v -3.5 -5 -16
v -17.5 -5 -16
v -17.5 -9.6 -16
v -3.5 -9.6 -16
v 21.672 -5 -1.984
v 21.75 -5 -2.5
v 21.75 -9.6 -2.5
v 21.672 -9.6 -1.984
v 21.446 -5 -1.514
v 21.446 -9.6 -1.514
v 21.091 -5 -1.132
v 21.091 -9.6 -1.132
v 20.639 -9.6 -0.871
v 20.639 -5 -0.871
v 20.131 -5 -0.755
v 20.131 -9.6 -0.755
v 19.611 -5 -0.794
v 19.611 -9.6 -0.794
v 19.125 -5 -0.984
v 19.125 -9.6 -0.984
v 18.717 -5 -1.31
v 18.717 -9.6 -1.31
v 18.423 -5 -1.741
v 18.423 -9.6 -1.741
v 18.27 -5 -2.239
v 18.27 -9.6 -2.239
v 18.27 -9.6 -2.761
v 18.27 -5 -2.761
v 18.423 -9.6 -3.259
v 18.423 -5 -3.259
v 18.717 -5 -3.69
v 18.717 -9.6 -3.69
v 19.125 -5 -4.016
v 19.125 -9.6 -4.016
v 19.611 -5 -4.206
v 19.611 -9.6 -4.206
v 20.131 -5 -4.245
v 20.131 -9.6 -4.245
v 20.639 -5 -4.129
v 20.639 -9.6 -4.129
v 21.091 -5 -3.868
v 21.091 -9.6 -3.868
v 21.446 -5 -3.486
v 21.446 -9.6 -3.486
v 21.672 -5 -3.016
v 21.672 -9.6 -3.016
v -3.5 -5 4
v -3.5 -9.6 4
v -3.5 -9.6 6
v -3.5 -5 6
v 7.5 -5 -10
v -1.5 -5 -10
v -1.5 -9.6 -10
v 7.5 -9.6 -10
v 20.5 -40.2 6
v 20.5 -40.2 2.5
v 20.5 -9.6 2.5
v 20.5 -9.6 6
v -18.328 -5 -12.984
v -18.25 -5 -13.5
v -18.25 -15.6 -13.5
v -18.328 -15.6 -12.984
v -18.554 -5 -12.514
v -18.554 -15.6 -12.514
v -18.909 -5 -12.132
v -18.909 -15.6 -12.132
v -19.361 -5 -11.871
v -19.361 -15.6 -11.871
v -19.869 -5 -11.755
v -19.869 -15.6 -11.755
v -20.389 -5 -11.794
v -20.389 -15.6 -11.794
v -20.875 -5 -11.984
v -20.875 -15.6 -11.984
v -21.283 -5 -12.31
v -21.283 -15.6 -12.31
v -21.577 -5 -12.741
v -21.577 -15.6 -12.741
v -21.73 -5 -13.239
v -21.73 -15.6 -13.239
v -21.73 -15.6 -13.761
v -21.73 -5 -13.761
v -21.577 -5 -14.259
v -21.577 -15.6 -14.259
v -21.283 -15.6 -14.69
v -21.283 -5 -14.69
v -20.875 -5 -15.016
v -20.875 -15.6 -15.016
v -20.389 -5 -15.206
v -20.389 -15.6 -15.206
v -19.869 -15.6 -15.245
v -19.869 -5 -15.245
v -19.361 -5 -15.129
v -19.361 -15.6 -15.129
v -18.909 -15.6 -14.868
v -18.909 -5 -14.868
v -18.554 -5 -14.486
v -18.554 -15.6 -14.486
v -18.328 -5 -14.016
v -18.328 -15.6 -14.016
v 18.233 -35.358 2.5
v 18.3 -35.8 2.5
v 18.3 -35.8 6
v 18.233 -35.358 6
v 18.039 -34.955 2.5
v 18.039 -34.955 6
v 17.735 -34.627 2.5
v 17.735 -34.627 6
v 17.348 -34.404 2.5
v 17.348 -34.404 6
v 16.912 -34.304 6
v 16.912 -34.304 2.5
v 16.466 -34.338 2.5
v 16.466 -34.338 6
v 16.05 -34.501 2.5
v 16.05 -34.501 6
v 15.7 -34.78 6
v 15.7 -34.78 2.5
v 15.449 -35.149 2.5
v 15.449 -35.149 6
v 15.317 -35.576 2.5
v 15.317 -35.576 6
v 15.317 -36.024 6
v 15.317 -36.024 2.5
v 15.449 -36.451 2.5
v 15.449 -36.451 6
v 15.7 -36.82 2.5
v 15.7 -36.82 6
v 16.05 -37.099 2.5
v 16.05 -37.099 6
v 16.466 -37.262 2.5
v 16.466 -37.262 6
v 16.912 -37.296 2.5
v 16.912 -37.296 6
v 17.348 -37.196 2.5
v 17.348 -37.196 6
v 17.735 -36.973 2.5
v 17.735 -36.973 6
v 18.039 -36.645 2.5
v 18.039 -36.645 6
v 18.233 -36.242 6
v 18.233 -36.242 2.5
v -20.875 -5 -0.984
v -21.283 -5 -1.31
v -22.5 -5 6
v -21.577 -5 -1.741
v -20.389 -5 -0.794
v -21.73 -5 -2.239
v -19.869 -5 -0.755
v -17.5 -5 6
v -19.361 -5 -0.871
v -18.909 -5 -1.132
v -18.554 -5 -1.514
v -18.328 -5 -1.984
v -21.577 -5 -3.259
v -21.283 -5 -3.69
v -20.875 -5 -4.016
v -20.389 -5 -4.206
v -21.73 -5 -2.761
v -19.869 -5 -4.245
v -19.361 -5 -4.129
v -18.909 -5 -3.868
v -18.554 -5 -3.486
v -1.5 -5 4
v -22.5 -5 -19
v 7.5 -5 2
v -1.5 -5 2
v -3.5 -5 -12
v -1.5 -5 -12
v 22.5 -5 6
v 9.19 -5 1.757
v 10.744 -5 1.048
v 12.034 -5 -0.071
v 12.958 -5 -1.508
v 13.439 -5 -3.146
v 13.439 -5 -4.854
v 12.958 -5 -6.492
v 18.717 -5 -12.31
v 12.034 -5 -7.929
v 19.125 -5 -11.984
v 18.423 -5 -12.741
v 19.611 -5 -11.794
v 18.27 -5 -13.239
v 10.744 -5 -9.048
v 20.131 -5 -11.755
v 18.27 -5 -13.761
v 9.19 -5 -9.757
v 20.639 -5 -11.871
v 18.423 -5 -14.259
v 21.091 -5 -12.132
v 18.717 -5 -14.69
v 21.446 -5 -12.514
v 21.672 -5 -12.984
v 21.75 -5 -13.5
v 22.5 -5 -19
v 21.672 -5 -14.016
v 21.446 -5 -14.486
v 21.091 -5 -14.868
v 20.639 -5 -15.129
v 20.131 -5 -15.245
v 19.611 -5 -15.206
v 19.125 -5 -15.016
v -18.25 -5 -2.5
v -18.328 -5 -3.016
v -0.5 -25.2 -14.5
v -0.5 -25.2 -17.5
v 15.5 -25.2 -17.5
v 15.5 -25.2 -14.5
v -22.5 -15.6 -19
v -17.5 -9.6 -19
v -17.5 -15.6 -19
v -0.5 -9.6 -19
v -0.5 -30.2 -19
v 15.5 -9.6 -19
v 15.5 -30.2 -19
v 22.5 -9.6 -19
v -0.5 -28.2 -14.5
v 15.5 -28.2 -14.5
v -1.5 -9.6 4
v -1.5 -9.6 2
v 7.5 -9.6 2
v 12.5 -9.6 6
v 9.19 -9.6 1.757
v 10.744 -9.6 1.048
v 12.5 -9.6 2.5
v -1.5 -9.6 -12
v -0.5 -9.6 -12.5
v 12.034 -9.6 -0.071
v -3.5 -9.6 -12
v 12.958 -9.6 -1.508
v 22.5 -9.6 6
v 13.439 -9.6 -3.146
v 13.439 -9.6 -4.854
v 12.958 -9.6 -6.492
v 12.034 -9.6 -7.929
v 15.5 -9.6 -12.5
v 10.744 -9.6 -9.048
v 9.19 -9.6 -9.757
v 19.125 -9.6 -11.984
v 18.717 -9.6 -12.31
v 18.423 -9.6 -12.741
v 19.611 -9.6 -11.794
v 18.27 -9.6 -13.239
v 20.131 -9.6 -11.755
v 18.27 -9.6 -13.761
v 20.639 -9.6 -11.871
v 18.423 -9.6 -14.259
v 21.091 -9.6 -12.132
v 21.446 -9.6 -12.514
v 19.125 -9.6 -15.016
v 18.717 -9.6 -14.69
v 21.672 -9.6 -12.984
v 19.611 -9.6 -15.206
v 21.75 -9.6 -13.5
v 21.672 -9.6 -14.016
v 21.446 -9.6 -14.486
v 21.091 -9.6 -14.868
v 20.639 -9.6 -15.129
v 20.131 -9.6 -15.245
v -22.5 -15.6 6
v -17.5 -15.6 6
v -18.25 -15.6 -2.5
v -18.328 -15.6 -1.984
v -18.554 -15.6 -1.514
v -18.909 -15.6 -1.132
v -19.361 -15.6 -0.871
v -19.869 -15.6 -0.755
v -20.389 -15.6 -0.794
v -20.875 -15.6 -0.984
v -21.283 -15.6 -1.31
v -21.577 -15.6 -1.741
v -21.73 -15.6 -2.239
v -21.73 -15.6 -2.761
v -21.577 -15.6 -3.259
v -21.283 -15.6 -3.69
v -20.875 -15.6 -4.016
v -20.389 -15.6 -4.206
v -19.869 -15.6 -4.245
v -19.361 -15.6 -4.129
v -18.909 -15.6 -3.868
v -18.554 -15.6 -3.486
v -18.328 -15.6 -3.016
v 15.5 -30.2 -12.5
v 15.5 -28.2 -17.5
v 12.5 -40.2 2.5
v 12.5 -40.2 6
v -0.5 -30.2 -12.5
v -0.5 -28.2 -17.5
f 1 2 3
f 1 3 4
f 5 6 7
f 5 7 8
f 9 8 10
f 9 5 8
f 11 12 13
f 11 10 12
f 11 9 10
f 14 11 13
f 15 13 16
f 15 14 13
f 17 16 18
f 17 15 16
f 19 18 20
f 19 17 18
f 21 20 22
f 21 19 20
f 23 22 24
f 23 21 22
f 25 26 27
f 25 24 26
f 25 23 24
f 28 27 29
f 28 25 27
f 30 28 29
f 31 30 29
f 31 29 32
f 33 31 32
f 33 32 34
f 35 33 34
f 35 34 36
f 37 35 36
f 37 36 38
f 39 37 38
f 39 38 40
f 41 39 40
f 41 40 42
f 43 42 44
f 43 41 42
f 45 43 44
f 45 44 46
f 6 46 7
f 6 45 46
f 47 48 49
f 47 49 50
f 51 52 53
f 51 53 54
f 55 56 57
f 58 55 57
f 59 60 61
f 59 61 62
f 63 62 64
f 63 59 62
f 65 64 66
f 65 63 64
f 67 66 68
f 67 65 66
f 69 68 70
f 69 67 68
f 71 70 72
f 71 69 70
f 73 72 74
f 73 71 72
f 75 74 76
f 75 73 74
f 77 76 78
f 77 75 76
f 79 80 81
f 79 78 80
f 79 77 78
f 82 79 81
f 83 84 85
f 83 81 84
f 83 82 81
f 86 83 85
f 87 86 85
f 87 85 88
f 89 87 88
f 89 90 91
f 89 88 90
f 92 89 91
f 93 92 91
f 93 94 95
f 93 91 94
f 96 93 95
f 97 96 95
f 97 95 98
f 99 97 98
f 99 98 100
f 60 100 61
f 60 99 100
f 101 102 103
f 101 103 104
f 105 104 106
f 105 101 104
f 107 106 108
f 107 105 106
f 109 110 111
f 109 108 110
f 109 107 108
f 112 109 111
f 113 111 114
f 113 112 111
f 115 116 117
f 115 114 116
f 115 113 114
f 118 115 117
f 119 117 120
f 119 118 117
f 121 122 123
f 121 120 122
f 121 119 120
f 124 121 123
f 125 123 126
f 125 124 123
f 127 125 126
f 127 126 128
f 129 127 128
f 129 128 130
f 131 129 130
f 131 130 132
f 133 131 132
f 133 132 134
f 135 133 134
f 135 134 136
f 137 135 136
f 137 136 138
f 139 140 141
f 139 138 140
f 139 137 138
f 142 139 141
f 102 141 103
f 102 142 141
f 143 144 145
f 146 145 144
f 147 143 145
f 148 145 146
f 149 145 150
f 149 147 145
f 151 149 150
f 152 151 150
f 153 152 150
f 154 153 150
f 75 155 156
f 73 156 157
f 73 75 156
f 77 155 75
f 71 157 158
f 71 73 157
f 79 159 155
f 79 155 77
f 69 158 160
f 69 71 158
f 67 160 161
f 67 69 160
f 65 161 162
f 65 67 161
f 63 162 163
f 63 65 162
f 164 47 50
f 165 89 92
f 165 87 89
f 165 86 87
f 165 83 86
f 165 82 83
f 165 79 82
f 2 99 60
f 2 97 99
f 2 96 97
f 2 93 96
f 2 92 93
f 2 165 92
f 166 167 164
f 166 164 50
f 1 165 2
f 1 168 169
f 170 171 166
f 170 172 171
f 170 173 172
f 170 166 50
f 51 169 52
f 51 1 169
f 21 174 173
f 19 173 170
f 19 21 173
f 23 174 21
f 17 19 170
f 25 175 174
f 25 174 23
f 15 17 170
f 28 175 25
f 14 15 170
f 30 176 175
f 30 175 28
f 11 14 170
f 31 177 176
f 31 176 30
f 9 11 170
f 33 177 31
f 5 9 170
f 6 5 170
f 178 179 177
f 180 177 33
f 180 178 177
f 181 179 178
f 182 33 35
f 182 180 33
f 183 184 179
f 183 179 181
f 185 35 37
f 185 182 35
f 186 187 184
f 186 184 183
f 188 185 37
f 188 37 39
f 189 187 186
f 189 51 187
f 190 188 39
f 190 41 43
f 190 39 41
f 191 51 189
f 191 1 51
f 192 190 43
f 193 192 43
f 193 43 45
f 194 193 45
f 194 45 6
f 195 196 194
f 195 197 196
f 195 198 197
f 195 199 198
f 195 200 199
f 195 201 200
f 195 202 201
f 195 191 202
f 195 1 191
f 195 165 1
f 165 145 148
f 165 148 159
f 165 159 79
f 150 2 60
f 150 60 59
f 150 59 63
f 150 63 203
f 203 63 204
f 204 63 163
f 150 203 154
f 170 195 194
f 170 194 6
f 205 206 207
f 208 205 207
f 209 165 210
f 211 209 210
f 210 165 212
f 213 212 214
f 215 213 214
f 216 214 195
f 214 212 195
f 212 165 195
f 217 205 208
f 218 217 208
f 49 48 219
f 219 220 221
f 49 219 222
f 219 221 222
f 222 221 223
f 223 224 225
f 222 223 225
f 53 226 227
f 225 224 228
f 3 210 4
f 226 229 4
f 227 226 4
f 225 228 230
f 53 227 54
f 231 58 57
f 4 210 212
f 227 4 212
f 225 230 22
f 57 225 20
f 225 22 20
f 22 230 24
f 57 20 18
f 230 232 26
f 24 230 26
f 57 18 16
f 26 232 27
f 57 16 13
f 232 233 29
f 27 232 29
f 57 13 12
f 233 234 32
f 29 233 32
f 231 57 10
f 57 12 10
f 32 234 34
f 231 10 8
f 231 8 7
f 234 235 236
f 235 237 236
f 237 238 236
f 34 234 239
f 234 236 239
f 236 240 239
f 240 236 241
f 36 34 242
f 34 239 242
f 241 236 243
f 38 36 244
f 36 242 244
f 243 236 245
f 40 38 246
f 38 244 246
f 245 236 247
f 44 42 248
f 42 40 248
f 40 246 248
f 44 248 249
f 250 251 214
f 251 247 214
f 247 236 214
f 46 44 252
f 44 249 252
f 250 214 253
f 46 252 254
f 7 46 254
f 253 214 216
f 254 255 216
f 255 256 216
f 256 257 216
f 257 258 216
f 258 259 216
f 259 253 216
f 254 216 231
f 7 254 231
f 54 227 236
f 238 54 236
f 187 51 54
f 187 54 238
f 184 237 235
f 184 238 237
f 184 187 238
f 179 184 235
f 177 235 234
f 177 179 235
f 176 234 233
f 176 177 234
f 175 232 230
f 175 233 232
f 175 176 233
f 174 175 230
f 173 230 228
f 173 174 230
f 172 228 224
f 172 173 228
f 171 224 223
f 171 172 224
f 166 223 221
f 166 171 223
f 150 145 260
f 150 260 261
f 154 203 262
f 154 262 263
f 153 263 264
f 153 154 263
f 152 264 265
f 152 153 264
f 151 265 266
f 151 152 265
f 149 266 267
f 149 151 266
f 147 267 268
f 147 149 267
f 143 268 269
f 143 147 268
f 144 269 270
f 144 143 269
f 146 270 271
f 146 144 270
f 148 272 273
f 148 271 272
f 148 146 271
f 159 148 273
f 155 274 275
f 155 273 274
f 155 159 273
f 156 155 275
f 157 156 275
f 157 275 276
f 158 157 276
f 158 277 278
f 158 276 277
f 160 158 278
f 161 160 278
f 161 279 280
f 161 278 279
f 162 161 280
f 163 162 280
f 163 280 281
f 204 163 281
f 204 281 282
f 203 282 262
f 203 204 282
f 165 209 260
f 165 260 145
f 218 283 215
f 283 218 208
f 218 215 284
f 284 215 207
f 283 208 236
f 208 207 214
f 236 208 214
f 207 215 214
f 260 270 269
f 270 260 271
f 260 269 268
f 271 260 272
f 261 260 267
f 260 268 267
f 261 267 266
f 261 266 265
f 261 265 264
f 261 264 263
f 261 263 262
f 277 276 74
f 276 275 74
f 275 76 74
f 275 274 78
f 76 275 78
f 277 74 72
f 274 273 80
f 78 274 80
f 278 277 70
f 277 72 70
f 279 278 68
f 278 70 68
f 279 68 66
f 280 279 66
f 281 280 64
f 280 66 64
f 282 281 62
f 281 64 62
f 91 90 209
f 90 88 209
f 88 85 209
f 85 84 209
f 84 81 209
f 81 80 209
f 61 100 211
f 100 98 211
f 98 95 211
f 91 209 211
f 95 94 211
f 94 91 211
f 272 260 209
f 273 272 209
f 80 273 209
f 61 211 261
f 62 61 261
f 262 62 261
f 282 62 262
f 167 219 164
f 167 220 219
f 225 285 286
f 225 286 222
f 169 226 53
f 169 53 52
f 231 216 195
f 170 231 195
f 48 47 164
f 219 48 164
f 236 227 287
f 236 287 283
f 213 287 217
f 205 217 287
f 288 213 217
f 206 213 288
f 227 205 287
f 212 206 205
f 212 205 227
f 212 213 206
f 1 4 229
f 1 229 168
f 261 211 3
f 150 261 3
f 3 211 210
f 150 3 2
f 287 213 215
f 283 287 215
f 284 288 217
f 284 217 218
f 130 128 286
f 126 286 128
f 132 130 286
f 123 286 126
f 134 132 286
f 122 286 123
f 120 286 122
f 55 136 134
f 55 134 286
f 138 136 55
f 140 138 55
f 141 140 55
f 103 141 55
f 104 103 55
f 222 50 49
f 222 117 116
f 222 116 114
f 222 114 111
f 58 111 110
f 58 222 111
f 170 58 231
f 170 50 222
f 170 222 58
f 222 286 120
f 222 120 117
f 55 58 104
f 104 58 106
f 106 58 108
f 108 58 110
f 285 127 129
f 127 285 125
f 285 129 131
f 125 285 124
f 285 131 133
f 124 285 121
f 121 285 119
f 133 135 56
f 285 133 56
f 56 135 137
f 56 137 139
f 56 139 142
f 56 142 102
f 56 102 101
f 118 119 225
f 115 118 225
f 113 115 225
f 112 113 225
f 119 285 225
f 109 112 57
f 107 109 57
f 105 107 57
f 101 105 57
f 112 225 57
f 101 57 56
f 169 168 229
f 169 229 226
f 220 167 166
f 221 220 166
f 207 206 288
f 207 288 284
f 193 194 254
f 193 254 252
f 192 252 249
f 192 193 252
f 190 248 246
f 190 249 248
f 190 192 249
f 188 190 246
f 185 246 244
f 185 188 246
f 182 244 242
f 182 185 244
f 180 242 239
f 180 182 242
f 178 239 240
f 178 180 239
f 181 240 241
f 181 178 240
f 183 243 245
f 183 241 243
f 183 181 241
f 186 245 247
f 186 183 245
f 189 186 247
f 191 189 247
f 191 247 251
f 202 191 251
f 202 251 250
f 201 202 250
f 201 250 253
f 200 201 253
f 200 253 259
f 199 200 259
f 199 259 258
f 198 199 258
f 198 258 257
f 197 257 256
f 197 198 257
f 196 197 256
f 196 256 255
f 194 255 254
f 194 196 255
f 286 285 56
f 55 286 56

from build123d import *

# Parameters (mm, degrees)
CYLINDER043_R           = 1.75
CYLINDER043_DEPTH       = 44
CYLINDER043_ROLL_ANGLE  = 90
CYLINDER045_R           = 6
CYLINDER045_DEPTH       = 34
CYLINDER045_ROLL_ANGLE  = 90
BOX078_W                = 17
BOX078_H                = 17.6
BOX078_DEPTH            = 12
CYLINDER046_R           = 1.75
CYLINDER046_DEPTH       = 44
CYLINDER046_ROLL_ANGLE  = 90
BOX082_W                = 2
BOX082_H                = 24.6
BOX082_DEPTH            = 16
CYLINDER040_R           = 1.75
CYLINDER040_DEPTH       = 44
CYLINDER040_ROLL_ANGLE  = 90
CYLINDER047_R           = 1.75
CYLINDER047_DEPTH       = 21
CYLINDER047_PITCH_ANGLE = 90
CYLINDER052_R           = 1.5
CYLINDER052_DEPTH       = 42
BOX088_W                = 42
BOX088_H                = 3
BOX088_DEPTH            = 3
CYLINDER044_R           = 1.75
CYLINDER044_DEPTH       = 44
CYLINDER044_ROLL_ANGLE  = 90
BOX075_W                = 26
BOX075_H                = 4.6
BOX075_DEPTH            = 25
BOX083_W                = 14
BOX083_H                = 4.6
BOX083_DEPTH            = 3
BOX086_W                = 8
BOX086_H                = 32.6
BOX086_DEPTH            = 3.5
BOX087_W                = 16
BOX087_H                = 20.6
BOX087_DEPTH            = 6.5
BOX079_W                = 5
BOX079_H                = 10.6
BOX079_DEPTH            = 25


with BuildPart() as cylinder_for_hole_9_groovemount_l004:
    # Cylinder043 → Cylinder043 (new body)
    with BuildSketch(Plane.XY):
        Circle(CYLINDER043_R)
    extrude(amount=CYLINDER043_DEPTH)


with BuildPart() as cylinder_for_hole_9_groovemount_l004_1:
    # Cylinder043 roll: moved
    add(cylinder_for_hole_9_groovemount_l004.part.rotate(Axis((0, 0, 0), (1, 0, 0)), CYLINDER043_ROLL_ANGLE))


with BuildPart() as cylinder_for_hole_9_groovemount_l004_2:
    # Cylinder043 placement: moved
    add(cylinder_for_hole_9_groovemount_l004_1.part.moved(Location((-20, 6, -2.5))))


with BuildPart() as jhead_hole001:
    # Cylinder045 → Cylinder045 (new body)
    with BuildSketch(Plane.XY):
        Circle(CYLINDER045_R)
    extrude(amount=CYLINDER045_DEPTH)


with BuildPart() as jhead_hole001_1:
    # Cylinder045 roll: moved
    add(jhead_hole001.part.rotate(Axis((0, 0, 0), (1, 0, 0)), CYLINDER045_ROLL_ANGLE))


with BuildPart() as jhead_hole001_2:
    # Cylinder045 placement: moved
    add(jhead_hole001_1.part.moved(Location((7.5, 0, -4))))


with BuildPart() as jhead_retention_plate_slide_in_hole001:
    # Box078 → Box078 (new body)
    with BuildSketch(Plane(origin=(-9.5, -14.6, -10), x_dir=(1, 0, 0), z_dir=(0, 0, 1))):
        with Locations((8.5, 8.8)):
            Rectangle(BOX078_W, BOX078_H)
    extrude(amount=BOX078_DEPTH)


with BuildPart() as cylinder_for_hole_4_motherboard004:
    # Cylinder046 → Cylinder046 (new body)
    with BuildSketch(Plane.XY):
        Circle(CYLINDER046_R)
    extrude(amount=CYLINDER046_DEPTH)


with BuildPart() as cylinder_for_hole_4_motherboard004_1:
    # Cylinder046 roll: moved
    add(cylinder_for_hole_4_motherboard004.part.rotate(Axis((0, 0, 0), (1, 0, 0)), CYLINDER046_ROLL_ANGLE))


with BuildPart() as cylinder_for_hole_4_motherboard004_2:
    # Cylinder046 placement: moved
    add(cylinder_for_hole_4_motherboard004_1.part.moved(Location((20, 6, -13.5))))


with BuildPart() as retention_hexagon_head_slide_in_hole:
    # Box082 → Box082 (new body)
    with BuildSketch(Plane(origin=(-3.5, -14.6, -12), x_dir=(1, 0, 0), z_dir=(0, 0, 1))):
        with Locations((1, 12.3)):
            Rectangle(BOX082_W, BOX082_H)
    extrude(amount=BOX082_DEPTH)


with BuildPart() as cylinder_for_hole_3_motherboard003:
    # Cylinder040 → Cylinder040 (new body)
    with BuildSketch(Plane.XY):
        Circle(CYLINDER040_R)
    extrude(amount=CYLINDER040_DEPTH)


with BuildPart() as cylinder_for_hole_3_motherboard003_1:
    # Cylinder040 roll: moved
    add(cylinder_for_hole_3_motherboard003.part.rotate(Axis((0, 0, 0), (1, 0, 0)), CYLINDER040_ROLL_ANGLE))


with BuildPart() as cylinder_for_hole_3_motherboard003_2:
    # Cylinder040 placement: moved
    add(cylinder_for_hole_3_motherboard003_1.part.moved(Location((-20, 6, -13.5))))


with BuildPart() as f_30x30_fan_hole:
    # Cylinder047 → Cylinder047 (new body)
    with BuildSketch(Plane.XY):
        Circle(CYLINDER047_R)
    extrude(amount=CYLINDER047_DEPTH)


with BuildPart() as f_30x30_fan_hole_1:
    # Cylinder047 pitch: moved
    add(f_30x30_fan_hole.part.rotate(Axis((0, 0, 0), (0, 1, 0)), CYLINDER047_PITCH_ANGLE))


with BuildPart() as f_30x30_fan_hole_2:
    # Cylinder047 placement: moved
    add(f_30x30_fan_hole_1.part.moved(Location((-24, -10, 11))))


with BuildPart() as extruder_screw_r:
    # Cylinder052 → Cylinder052 (new body)
    with BuildSketch(Plane(origin=(16.8, -35.8, -8), x_dir=(1, 0, 0), z_dir=(0, 0, 1))):
        Circle(CYLINDER052_R)
    extrude(amount=CYLINDER052_DEPTH)


with BuildPart() as fastener_hole:
    # Box088 → Box088 (new body)
    with BuildSketch(Plane(origin=(-21.5, -28.2, -17.5), x_dir=(1, 0, 0), z_dir=(0, 0, 1))):
        with Locations((21, 1.5)):
            Rectangle(BOX088_W, BOX088_H)
    extrude(amount=BOX088_DEPTH)


with BuildPart() as hexagon_retention_block_holes:
    # Cylinder044 → Cylinder044 (new body)
    with BuildSketch(Plane.XY):
        Circle(CYLINDER044_R)
    extrude(amount=CYLINDER044_DEPTH)


with BuildPart() as hexagon_retention_block_holes_1:
    # Cylinder044 roll: moved
    add(hexagon_retention_block_holes.part.rotate(Axis((0, 0, 0), (1, 0, 0)), CYLINDER044_ROLL_ANGLE))


with BuildPart() as hexagon_retention_block_holes_2:
    # Cylinder044 placement: moved
    add(hexagon_retention_block_holes_1.part.moved(Location((20, 6, -2.5))))

    # Fusion020: union cylinder for hole 9 - Groovemount L004, jhead hole001, jhead retention plate slide in hole001, cylinder for hole 4 - Motherboard004, retention hexagon head slide in hole, cylinder for hole 3 - Motherboard003, 30x30 fan hole, extruder screw  R, fastener hole
    add(cylinder_for_hole_9_groovemount_l004_2.part)
    add(jhead_hole001_2.part)
    add(jhead_retention_plate_slide_in_hole001.part)
    add(cylinder_for_hole_4_motherboard004_2.part)
    add(retention_hexagon_head_slide_in_hole.part)
    add(cylinder_for_hole_3_motherboard003_2.part)
    add(f_30x30_fan_hole_2.part)
    add(extruder_screw_r.part)
    add(fastener_hole.part)


with BuildPart() as jhead_retention_plate_body001:
    # Box075 → Box075 (new body)
    with BuildSketch(Plane(origin=(-3.5, -9.6, -19), x_dir=(1, 0, 0), z_dir=(0, 0, 1))):
        with Locations((13, 2.3)):
            Rectangle(BOX075_W, BOX075_H)
    extrude(amount=BOX075_DEPTH)


with BuildPart() as fan_bracket_retention_plate_joint:
    # Box083 → Box083 (new body)
    with BuildSketch(Plane(origin=(-17.5, -9.6, -19), x_dir=(1, 0, 0), z_dir=(0, 0, 1))):
        with Locations((7, 2.3)):
            Rectangle(BOX083_W, BOX083_H)
    extrude(amount=BOX083_DEPTH)


with BuildPart() as motor_bracket_base_r:
    # Box086 → Box086 (new body)
    with BuildSketch(Plane(origin=(12.5, -40.2, 2.5), x_dir=(1, 0, 0), z_dir=(0, 0, 1))):
        with Locations((4, 16.3)):
            Rectangle(BOX086_W, BOX086_H)
    extrude(amount=BOX086_DEPTH)


with BuildPart() as motor_support:
    # Box087 → Box087 (new body)
    with BuildSketch(Plane(origin=(-0.5, -30.2, -19), x_dir=(1, 0, 0), z_dir=(0, 0, 1))):
        with Locations((8, 10.3)):
            Rectangle(BOX087_W, BOX087_H)
    extrude(amount=BOX087_DEPTH)


with BuildPart() as hexagon_retention_block_with_holes:
    # Box079 → Box079 (new body)
    with BuildSketch(Plane(origin=(-22.5, -15.6, -19), x_dir=(1, 0, 0), z_dir=(0, 0, 1))):
        with Locations((2.5, 5.3)):
            Rectangle(BOX079_W, BOX079_H)
    extrude(amount=BOX079_DEPTH)

    # Fusion021: union jhead retention plate body001, fan bracket retention plate joint, motor bracket base R, motor support
    add(jhead_retention_plate_body001.part)
    add(fan_bracket_retention_plate_joint.part)
    add(motor_bracket_base_r.part)
    add(motor_support.part)

    # Cut012: cut hexagon retention block holes
    add(hexagon_retention_block_holes_2.part, mode=Mode.SUBTRACT)


solid = hexagon_retention_block_with_holes.part
